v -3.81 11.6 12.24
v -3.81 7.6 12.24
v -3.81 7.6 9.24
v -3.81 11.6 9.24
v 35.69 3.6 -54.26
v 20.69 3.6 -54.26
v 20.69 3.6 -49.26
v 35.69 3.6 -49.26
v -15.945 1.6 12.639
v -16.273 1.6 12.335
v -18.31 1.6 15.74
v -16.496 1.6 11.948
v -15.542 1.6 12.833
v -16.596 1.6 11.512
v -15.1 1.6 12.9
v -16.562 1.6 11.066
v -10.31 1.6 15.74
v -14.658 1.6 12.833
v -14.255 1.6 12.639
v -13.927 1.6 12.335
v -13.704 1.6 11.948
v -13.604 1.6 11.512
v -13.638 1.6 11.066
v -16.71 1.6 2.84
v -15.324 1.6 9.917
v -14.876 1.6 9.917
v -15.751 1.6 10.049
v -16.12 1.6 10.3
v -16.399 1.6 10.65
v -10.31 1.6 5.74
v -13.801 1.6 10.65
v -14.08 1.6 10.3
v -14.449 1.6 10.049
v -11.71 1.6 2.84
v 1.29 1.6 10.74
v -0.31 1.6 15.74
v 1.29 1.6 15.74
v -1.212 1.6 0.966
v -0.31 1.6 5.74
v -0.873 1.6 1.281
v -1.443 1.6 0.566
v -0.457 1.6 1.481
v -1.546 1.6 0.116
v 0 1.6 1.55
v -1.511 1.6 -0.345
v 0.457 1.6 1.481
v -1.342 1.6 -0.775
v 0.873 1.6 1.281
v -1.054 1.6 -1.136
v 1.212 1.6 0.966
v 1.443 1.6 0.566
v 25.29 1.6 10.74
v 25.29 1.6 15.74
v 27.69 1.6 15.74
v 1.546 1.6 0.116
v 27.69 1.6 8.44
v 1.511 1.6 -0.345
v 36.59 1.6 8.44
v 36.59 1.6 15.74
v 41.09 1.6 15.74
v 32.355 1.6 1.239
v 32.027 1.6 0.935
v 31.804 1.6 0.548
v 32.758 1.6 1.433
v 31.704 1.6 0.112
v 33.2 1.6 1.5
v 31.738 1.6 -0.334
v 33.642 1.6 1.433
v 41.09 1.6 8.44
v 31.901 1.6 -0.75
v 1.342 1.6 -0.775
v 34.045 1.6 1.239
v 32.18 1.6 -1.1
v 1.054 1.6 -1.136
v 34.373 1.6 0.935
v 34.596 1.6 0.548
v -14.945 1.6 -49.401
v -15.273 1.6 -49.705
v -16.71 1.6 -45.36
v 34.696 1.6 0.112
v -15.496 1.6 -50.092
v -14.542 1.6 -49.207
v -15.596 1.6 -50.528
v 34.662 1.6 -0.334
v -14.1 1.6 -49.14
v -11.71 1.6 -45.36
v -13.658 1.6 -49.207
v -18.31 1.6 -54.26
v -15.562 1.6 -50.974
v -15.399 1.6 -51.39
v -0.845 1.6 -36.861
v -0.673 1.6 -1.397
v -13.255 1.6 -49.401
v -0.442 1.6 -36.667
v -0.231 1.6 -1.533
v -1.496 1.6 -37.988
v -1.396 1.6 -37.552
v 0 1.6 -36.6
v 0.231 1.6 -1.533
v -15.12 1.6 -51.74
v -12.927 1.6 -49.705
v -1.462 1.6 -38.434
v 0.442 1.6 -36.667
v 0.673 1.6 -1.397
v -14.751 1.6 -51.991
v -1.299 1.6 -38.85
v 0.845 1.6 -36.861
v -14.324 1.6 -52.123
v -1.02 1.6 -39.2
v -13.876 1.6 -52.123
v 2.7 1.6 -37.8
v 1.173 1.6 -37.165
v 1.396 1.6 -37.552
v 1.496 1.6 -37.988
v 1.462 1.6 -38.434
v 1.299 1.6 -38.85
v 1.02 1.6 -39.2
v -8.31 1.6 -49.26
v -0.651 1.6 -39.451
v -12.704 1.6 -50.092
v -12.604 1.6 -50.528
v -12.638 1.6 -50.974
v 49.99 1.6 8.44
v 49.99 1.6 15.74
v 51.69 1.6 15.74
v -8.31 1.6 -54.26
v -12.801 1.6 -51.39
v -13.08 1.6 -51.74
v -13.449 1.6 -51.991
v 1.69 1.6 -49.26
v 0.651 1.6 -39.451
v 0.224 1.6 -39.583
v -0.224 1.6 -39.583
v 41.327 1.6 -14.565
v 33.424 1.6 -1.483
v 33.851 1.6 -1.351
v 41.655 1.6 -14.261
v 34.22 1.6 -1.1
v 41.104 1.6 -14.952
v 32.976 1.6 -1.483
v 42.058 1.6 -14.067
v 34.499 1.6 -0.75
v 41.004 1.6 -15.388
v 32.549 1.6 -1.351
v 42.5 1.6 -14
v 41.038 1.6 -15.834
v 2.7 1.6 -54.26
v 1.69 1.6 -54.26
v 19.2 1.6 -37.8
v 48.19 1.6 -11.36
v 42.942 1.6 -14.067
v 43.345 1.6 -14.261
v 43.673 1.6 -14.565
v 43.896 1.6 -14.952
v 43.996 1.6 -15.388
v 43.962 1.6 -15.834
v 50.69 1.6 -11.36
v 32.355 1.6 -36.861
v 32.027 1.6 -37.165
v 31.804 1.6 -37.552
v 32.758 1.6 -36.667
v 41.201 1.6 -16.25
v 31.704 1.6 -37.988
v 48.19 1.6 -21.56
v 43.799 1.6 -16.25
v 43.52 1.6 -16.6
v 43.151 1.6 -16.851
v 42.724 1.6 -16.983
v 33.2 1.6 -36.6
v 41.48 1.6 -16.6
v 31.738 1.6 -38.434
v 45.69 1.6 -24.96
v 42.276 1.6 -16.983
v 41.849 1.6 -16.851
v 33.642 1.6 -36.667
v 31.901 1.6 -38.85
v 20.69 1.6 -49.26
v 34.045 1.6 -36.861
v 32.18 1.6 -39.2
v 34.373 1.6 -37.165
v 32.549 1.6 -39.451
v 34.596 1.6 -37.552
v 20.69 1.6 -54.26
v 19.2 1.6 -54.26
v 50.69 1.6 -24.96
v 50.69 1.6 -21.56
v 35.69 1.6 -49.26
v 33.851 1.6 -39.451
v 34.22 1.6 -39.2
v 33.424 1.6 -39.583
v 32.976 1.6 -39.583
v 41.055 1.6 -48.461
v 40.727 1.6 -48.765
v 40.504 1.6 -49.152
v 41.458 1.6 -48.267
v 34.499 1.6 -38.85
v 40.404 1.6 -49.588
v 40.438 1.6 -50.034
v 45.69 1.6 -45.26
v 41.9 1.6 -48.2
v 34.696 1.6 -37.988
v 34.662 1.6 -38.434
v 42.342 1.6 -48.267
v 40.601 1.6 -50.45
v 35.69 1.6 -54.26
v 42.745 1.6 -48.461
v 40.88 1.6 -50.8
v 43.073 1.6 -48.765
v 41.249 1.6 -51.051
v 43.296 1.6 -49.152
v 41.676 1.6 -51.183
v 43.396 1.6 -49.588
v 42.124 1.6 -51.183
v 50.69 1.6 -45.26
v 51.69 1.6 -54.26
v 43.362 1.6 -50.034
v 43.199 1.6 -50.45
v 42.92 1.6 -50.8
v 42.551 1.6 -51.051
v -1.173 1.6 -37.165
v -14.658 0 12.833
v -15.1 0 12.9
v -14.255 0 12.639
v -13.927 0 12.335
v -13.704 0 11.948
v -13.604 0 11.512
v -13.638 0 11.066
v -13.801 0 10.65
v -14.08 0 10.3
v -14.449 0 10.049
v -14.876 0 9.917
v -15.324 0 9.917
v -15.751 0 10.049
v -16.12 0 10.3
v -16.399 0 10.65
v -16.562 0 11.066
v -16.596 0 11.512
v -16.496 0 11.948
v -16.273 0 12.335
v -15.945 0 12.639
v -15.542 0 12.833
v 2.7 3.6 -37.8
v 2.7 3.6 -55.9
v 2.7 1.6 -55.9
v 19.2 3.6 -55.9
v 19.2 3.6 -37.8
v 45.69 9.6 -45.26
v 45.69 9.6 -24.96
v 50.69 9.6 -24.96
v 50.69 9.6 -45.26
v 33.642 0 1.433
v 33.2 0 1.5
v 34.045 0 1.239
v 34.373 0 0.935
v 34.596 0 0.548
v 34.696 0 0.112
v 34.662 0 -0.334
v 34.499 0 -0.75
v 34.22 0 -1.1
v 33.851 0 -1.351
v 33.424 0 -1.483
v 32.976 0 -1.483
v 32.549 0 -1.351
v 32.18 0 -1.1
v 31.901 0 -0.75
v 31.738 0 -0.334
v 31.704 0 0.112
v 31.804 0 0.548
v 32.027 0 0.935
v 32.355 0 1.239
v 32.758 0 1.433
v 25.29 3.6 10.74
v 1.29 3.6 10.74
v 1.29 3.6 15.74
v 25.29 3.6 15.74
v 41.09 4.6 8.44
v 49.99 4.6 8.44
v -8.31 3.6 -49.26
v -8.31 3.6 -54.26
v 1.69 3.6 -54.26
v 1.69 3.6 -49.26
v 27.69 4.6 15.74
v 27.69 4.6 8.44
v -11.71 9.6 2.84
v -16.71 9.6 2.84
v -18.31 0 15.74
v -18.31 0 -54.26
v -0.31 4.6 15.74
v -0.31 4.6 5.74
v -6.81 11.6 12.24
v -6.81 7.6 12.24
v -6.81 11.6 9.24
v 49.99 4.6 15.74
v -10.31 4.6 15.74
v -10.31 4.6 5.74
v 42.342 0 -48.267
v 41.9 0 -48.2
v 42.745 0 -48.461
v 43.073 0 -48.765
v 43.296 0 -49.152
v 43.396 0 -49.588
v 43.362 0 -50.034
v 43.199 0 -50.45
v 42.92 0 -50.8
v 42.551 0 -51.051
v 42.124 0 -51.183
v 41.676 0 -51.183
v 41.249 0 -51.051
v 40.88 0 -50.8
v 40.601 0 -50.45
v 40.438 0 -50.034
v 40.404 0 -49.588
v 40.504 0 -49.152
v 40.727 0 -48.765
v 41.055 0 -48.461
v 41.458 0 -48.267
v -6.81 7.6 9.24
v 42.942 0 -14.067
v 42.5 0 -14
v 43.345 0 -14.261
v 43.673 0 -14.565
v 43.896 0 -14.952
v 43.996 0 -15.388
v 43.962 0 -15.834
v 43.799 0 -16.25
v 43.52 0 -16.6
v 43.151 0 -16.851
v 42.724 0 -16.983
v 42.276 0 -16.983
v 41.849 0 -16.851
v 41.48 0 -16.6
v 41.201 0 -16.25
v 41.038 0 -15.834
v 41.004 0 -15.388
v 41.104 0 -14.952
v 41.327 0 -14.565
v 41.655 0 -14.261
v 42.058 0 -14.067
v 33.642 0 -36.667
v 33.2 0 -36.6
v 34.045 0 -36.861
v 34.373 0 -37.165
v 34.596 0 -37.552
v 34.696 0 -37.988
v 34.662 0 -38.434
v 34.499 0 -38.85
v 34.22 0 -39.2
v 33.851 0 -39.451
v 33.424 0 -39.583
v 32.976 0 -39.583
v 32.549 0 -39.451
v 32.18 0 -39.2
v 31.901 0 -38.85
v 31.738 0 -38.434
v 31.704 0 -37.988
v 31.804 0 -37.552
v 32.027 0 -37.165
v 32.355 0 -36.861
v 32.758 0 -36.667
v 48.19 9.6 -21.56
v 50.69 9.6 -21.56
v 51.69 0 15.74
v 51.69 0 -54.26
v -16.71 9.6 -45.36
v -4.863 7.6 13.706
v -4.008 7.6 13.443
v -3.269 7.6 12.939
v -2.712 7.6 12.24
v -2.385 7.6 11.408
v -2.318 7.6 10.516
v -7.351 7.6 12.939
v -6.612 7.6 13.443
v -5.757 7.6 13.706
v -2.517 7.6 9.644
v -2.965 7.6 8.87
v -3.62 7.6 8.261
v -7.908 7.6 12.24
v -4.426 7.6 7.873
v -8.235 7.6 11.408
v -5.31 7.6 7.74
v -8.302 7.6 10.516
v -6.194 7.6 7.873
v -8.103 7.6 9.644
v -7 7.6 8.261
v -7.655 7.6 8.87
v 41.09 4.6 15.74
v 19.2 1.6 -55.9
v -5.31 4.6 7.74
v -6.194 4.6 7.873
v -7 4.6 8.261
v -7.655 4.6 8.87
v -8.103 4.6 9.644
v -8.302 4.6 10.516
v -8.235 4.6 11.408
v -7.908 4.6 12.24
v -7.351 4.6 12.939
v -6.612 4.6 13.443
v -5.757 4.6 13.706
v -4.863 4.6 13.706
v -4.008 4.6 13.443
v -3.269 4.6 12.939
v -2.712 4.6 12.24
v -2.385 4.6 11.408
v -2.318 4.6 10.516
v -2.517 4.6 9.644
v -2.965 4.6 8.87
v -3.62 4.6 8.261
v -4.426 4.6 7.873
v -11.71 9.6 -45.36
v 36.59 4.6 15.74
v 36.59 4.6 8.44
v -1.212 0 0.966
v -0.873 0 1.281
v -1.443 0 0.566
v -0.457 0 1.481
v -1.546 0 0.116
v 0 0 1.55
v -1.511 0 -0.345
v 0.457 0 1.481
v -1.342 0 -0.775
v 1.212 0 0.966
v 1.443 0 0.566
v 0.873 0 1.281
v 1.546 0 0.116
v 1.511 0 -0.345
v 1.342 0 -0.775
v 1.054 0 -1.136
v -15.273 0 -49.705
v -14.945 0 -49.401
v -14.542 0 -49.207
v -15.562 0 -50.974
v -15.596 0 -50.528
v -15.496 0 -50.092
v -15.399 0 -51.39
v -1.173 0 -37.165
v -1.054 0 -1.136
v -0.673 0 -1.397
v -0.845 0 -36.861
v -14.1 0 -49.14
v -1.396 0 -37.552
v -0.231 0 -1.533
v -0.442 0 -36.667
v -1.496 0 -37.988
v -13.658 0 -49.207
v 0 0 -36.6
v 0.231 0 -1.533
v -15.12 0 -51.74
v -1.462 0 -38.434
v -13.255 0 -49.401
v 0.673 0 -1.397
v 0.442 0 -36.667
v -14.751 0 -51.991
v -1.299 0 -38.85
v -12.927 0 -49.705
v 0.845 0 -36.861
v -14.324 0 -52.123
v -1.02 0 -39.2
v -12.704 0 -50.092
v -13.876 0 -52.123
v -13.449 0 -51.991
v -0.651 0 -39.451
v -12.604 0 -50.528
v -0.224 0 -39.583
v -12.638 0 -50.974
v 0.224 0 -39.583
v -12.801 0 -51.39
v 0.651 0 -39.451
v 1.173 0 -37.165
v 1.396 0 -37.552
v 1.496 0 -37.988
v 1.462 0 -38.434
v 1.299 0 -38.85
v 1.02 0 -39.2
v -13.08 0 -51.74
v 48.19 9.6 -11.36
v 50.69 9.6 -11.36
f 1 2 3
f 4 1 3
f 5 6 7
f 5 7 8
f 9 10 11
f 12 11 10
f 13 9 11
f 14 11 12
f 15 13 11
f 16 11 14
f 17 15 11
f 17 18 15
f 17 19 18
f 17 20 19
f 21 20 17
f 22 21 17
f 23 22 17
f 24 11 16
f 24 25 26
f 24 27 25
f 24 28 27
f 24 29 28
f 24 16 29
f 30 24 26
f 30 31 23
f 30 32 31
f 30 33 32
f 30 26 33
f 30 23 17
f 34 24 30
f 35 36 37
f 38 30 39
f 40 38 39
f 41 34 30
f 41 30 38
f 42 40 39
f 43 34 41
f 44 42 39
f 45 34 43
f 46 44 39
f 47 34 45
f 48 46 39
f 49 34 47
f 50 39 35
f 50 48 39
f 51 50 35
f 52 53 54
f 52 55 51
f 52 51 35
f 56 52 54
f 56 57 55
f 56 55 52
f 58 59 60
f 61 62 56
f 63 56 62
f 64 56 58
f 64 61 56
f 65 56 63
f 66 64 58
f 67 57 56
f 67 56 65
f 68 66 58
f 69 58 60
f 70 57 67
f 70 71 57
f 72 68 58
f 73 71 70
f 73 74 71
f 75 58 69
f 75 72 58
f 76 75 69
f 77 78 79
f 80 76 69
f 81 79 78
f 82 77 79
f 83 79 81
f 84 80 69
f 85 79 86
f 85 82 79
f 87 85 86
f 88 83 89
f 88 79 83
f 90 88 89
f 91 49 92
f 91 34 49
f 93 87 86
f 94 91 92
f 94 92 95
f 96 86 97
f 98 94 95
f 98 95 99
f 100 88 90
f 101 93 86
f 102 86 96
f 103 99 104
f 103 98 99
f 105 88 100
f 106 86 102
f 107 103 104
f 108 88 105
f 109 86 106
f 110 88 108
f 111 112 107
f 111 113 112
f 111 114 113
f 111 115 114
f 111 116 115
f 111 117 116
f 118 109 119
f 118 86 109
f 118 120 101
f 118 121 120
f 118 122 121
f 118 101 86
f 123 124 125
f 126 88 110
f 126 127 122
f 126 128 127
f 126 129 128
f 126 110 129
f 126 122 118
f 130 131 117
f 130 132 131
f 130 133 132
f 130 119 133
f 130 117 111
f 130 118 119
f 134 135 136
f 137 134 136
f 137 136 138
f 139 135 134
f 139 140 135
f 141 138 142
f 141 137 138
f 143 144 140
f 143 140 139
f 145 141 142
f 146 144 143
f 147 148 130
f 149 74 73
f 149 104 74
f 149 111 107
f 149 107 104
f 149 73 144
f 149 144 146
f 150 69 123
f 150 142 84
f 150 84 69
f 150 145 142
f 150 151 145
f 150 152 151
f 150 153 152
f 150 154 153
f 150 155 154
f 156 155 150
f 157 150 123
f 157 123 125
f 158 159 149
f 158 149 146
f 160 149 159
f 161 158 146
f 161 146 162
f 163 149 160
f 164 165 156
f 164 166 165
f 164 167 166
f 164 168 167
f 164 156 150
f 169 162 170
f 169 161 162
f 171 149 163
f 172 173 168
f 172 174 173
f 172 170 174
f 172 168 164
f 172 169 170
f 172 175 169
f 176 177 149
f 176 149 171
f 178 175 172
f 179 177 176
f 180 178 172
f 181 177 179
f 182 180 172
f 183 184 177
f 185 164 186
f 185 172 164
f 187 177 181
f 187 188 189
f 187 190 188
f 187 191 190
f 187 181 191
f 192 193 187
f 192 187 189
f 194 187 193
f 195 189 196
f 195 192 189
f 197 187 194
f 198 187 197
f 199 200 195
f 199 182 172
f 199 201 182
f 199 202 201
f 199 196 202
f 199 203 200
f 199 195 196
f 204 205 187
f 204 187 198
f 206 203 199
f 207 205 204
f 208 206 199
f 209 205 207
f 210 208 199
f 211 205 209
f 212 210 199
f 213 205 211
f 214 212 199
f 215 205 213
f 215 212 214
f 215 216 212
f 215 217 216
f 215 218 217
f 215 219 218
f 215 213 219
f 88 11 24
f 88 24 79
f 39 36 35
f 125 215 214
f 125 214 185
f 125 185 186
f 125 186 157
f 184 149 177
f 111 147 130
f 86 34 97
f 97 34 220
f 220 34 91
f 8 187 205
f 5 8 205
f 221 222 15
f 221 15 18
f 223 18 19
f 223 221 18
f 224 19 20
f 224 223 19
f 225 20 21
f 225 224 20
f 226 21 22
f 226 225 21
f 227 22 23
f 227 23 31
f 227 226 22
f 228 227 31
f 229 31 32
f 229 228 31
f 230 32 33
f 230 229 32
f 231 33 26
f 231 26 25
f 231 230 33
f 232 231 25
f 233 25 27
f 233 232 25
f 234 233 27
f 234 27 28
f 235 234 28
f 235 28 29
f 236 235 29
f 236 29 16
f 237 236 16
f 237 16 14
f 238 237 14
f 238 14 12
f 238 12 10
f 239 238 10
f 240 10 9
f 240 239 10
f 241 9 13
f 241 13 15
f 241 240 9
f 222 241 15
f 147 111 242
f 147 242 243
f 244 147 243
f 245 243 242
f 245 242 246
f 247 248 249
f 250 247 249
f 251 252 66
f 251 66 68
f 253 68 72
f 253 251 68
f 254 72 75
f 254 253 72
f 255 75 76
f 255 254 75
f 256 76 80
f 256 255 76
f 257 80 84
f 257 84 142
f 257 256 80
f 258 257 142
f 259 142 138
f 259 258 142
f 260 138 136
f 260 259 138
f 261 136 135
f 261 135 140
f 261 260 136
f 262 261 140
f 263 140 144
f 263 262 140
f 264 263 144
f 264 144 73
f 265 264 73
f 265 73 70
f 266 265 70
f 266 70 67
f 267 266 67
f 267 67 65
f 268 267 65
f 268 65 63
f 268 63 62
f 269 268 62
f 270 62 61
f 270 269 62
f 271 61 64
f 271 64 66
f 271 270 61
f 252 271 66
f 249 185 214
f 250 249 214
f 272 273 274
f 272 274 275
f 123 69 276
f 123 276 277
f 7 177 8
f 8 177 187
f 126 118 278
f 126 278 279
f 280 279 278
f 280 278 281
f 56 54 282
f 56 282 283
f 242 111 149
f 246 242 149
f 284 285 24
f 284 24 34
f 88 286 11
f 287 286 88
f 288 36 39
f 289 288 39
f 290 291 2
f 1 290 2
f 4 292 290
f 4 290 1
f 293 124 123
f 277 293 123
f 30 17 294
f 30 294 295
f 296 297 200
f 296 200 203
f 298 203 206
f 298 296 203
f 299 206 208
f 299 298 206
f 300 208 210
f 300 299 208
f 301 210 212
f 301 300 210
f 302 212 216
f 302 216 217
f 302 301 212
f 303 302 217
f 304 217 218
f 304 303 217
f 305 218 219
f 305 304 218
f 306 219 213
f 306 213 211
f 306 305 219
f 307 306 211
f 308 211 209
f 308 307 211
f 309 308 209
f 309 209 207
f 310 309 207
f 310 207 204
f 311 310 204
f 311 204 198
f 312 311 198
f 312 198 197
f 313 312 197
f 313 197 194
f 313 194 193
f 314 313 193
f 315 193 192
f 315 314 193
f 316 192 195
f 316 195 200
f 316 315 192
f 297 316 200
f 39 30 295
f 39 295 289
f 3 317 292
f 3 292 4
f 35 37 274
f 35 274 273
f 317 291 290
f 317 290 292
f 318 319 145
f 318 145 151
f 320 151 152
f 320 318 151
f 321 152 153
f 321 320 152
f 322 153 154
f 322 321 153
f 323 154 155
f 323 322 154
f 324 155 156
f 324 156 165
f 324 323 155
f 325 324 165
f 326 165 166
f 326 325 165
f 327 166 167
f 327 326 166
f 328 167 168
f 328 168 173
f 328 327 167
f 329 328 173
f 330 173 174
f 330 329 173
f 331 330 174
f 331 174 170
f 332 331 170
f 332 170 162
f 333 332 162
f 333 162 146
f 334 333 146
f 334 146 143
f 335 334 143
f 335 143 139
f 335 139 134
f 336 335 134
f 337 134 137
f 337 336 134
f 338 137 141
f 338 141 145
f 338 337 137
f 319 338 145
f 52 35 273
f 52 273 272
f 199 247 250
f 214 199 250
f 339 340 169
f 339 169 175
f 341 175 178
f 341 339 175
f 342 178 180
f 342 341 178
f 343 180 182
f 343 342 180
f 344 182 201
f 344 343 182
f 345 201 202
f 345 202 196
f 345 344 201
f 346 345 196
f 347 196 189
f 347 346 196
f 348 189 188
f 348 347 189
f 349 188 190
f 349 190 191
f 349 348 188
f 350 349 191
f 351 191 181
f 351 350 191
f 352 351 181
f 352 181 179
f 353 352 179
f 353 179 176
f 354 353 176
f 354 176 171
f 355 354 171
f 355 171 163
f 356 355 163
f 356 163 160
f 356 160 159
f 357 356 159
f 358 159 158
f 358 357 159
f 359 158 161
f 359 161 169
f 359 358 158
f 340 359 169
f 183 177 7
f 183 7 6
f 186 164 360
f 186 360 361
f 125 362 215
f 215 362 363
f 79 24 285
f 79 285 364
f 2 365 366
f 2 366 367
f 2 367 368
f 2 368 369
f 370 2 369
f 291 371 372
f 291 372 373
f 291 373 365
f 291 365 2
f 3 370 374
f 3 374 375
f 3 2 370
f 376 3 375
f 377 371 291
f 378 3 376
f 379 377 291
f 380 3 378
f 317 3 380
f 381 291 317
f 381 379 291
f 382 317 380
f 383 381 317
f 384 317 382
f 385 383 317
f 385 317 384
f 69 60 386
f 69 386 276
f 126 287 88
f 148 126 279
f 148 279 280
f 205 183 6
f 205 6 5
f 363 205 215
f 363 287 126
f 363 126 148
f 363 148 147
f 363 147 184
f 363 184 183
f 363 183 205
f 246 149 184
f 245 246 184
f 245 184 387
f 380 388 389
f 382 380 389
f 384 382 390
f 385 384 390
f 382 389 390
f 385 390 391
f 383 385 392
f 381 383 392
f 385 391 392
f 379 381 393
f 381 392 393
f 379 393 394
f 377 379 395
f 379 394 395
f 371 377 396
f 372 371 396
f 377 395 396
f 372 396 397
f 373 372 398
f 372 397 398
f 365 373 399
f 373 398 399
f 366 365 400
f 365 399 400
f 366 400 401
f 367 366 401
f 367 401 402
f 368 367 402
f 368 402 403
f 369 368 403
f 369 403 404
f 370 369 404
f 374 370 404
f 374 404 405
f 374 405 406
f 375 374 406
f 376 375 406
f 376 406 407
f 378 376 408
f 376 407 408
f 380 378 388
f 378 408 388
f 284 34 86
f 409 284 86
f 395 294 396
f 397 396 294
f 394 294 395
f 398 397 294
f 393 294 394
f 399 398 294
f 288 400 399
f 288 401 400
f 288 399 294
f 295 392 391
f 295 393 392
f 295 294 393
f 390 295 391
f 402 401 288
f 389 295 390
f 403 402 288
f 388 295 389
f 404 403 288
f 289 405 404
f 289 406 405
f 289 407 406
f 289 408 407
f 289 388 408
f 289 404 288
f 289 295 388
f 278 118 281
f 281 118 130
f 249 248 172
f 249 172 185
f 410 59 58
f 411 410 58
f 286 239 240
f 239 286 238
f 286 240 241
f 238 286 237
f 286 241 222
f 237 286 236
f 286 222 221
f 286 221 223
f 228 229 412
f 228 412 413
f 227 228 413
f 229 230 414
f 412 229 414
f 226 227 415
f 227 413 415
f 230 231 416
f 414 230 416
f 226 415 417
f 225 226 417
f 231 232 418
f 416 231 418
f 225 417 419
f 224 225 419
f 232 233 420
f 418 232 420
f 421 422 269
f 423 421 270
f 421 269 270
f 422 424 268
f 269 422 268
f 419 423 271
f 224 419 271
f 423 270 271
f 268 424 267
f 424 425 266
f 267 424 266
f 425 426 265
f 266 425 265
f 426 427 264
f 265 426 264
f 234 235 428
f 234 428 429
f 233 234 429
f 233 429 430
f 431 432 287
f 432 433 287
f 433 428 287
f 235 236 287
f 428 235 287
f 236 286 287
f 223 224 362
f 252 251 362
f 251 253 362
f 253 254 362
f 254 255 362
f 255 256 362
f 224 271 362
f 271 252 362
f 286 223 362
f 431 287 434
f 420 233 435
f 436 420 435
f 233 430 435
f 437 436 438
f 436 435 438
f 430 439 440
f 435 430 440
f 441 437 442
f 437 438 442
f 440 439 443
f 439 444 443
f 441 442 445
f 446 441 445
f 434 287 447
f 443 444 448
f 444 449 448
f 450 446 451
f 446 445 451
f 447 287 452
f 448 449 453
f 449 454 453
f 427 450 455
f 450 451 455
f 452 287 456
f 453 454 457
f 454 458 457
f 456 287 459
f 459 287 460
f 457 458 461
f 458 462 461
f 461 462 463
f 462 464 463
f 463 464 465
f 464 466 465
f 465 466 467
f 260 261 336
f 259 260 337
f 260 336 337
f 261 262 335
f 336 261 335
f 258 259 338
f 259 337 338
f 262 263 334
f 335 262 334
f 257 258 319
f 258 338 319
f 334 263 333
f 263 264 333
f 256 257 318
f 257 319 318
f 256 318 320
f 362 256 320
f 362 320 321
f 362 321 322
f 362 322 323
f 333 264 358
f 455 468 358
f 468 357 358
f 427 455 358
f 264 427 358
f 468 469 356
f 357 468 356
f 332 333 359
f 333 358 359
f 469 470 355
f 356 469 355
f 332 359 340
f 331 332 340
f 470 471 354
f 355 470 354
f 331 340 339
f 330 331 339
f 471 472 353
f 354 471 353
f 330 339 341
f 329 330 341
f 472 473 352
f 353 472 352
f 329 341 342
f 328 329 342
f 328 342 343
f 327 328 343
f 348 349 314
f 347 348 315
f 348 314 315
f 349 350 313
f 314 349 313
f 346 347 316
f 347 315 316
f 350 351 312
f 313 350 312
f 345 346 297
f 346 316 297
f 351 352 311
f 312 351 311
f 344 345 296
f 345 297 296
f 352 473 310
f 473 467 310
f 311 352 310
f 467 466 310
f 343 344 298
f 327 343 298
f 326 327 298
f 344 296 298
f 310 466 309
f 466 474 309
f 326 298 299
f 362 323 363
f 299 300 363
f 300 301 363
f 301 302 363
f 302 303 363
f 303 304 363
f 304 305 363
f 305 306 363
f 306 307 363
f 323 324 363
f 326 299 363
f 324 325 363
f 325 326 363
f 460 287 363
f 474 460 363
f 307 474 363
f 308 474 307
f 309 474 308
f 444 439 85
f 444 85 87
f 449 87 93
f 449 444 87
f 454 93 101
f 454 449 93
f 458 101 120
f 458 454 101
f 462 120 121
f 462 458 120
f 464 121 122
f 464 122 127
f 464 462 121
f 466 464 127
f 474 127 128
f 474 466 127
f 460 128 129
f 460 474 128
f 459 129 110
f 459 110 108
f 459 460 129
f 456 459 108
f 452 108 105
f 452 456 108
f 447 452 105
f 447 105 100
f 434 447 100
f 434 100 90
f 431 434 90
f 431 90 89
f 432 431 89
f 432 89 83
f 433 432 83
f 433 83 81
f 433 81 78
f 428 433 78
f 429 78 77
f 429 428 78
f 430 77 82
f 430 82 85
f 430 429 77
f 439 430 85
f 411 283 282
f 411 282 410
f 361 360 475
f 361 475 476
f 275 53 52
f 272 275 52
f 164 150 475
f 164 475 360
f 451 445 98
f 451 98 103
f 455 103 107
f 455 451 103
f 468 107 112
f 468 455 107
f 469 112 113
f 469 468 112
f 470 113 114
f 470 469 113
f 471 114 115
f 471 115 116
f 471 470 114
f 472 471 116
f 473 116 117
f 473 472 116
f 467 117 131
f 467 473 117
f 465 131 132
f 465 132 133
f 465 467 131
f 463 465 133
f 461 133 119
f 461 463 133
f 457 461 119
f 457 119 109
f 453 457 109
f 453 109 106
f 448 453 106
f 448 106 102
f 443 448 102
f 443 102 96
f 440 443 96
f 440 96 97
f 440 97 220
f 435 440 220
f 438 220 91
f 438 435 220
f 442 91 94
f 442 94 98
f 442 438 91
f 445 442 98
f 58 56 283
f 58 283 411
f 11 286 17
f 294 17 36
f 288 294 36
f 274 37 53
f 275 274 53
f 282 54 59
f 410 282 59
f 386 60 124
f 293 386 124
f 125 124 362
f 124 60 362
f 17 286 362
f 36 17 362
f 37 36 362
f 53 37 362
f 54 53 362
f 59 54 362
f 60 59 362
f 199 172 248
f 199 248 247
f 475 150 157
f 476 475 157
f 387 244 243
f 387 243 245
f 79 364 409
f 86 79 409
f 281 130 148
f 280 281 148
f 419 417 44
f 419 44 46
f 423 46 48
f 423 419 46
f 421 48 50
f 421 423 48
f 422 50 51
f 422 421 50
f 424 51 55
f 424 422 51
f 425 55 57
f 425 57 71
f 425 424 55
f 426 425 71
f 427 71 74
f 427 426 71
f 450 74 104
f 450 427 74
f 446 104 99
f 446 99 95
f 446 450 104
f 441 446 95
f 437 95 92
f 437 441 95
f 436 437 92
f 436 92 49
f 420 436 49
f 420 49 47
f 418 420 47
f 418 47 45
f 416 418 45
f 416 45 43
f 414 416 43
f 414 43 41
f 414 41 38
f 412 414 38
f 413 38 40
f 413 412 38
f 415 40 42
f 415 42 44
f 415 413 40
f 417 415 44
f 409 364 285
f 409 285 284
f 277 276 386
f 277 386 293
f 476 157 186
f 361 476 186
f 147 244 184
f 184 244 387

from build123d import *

# Parameters (mm, degrees)
SKETCH_1_W      = 70
SKETCH_1_H      = 70
SKETCH_1_R      = 1.55
SKETCH_1_R_2    = 1.5
EXTRUDE_1_DEPTH = 1.6
SKETCH_3_W      = 16.5
SKETCH_3_H      = 18.1
EXTRUDE_2_DEPTH = 2
SKETCH_5_W      = 8.9
SKETCH_5_H      = 7.3
EXTRUDE_3_DEPTH = 3
SKETCH_6_W      = 10
SKETCH_6_H      = 10
EXTRUDE_4_DEPTH = 3
SKETCH_7_R      = 3
EXTRUDE_5_DEPTH = 3
SKETCH_8_W      = 3
SKETCH_8_H      = 3
EXTRUDE_6_DEPTH = 4
SKETCH_9_W      = 24
SKETCH_9_H      = 5
SKETCH_9_W_2    = 10
SKETCH_9_W_3    = 15
EXTRUDE_7_DEPTH = 2
SKETCH_10_W     = 5
SKETCH_10_H     = 48.2
SKETCH_10_H_2   = 20.3
SKETCH_10_W_2   = 2.5
SKETCH_10_H_3   = 10.2
EXTRUDE_8_DEPTH = 8


with BuildPart() as part:
    # 草图1 → 凸台-拉伸1 (new body)
    with BuildSketch(Plane(origin=(0, 0, 0), x_dir=(1, 0, 0), z_dir=(0, 1, 0))):
        with Locations((16.69, 19.26)):
            Rectangle(SKETCH_1_W, SKETCH_1_H)
        with Locations(Location((0, 0, 0), (0, 0, 270))):
            Circle(SKETCH_1_R, mode=Mode.SUBTRACT)
        with Locations(Location((33.2, 0, 0), (0, 0, 270))):
            Circle(SKETCH_1_R_2, mode=Mode.SUBTRACT)
        with Locations(Location((0, 38.1, 0), (0, 0, 270))):
            Circle(SKETCH_1_R_2, mode=Mode.SUBTRACT)
        with Locations(Location((33.2, 38.1, 0), (0, 0, 270))):
            Circle(SKETCH_1_R_2, mode=Mode.SUBTRACT)
        with Locations(Location((-14.1, 50.64, 0), (0, 0, 270))):
            Circle(SKETCH_1_R_2, mode=Mode.SUBTRACT)
        with Locations(Location((41.9, 49.7, 0), (0, 0, 270))):
            Circle(SKETCH_1_R_2, mode=Mode.SUBTRACT)
        with Locations(Location((42.5, 15.5, 0), (0, 0, 270))):
            Circle(SKETCH_1_R_2, mode=Mode.SUBTRACT)
        with Locations(Location((-15.1, -11.4, 0), (0, 0, 270))):
            Circle(SKETCH_1_R_2, mode=Mode.SUBTRACT)
    extrude(amount=EXTRUDE_1_DEPTH)

    # 草图3 → 凸台-拉伸2 (add)
    with BuildSketch(Plane(origin=(0, 1.6, 0), x_dir=(1, 0, 0), z_dir=(0, 1, 0))):
        with Locations((10.95, 46.85)):
            Rectangle(SKETCH_3_W, SKETCH_3_H)
    extrude(amount=EXTRUDE_2_DEPTH)

    # 草图5 → 凸台-拉伸3 (add)
    with BuildSketch(Plane(origin=(0, 1.6, 0), x_dir=(1, 0, 0), z_dir=(0, 1, 0))):
        with Locations((45.54, -12.09)):
            Rectangle(SKETCH_5_W, SKETCH_5_H)
        with Locations((32.14, -12.09)):
            Rectangle(SKETCH_5_W, SKETCH_5_H)
    extrude(amount=EXTRUDE_3_DEPTH)

    # 草图6 → 凸台-拉伸4 (add)
    with BuildSketch(Plane(origin=(0, 1.6, 0), x_dir=(1, 0, 0), z_dir=(0, 1, 0))):
        with Locations((-5.31, -10.74)):
            Rectangle(SKETCH_6_W, SKETCH_6_H)
    extrude(amount=EXTRUDE_4_DEPTH)

    # 草图7 → 凸台-拉伸5 (add)
    with BuildSketch(Plane(origin=(0, 4.6, 0), x_dir=(1, 0, 0), z_dir=(0, 1, 0))):
        with Locations(Location((-5.31, -10.74, 0), (0, 0, 90))):
            Circle(SKETCH_7_R)
    extrude(amount=EXTRUDE_5_DEPTH)

    # 草图8 → 凸台-拉伸6 (add)
    with BuildSketch(Plane(origin=(0, 7.6, 0), x_dir=(1, 0, 0), z_dir=(0, 1, 0))):
        with Locations((-5.31, -10.74)):
            Rectangle(SKETCH_8_W, SKETCH_8_H)
    extrude(amount=EXTRUDE_6_DEPTH)

    # 草图9 → 凸台-拉伸7 (add)
    with BuildSketch(Plane(origin=(0, 1.6, 0), x_dir=(1, 0, 0), z_dir=(0, 1, 0))):
        with Locations((13.29, -13.24)):
            Rectangle(SKETCH_9_W, SKETCH_9_H)
        with Locations((-3.31, 51.76)):
            Rectangle(SKETCH_9_W_2, SKETCH_9_H)
        with Locations((28.19, 51.76)):
            Rectangle(SKETCH_9_W_3, SKETCH_9_H)
    extrude(amount=EXTRUDE_7_DEPTH)

    # 草图10 → 凸台-拉伸8 (add)
    with BuildSketch(Plane(origin=(0, 1.6, 0), x_dir=(1, 0, 0), z_dir=(0, 1, 0))):
        with Locations((-14.21, 21.26)):
            Rectangle(SKETCH_10_W, SKETCH_10_H)
        with Locations((48.19, 35.11)):
            Rectangle(SKETCH_10_W, SKETCH_10_H_2)
        with Locations((49.44, 16.46)):
            Rectangle(SKETCH_10_W_2, SKETCH_10_H_3)
    extrude(amount=EXTRUDE_8_DEPTH)


solid = part.part
